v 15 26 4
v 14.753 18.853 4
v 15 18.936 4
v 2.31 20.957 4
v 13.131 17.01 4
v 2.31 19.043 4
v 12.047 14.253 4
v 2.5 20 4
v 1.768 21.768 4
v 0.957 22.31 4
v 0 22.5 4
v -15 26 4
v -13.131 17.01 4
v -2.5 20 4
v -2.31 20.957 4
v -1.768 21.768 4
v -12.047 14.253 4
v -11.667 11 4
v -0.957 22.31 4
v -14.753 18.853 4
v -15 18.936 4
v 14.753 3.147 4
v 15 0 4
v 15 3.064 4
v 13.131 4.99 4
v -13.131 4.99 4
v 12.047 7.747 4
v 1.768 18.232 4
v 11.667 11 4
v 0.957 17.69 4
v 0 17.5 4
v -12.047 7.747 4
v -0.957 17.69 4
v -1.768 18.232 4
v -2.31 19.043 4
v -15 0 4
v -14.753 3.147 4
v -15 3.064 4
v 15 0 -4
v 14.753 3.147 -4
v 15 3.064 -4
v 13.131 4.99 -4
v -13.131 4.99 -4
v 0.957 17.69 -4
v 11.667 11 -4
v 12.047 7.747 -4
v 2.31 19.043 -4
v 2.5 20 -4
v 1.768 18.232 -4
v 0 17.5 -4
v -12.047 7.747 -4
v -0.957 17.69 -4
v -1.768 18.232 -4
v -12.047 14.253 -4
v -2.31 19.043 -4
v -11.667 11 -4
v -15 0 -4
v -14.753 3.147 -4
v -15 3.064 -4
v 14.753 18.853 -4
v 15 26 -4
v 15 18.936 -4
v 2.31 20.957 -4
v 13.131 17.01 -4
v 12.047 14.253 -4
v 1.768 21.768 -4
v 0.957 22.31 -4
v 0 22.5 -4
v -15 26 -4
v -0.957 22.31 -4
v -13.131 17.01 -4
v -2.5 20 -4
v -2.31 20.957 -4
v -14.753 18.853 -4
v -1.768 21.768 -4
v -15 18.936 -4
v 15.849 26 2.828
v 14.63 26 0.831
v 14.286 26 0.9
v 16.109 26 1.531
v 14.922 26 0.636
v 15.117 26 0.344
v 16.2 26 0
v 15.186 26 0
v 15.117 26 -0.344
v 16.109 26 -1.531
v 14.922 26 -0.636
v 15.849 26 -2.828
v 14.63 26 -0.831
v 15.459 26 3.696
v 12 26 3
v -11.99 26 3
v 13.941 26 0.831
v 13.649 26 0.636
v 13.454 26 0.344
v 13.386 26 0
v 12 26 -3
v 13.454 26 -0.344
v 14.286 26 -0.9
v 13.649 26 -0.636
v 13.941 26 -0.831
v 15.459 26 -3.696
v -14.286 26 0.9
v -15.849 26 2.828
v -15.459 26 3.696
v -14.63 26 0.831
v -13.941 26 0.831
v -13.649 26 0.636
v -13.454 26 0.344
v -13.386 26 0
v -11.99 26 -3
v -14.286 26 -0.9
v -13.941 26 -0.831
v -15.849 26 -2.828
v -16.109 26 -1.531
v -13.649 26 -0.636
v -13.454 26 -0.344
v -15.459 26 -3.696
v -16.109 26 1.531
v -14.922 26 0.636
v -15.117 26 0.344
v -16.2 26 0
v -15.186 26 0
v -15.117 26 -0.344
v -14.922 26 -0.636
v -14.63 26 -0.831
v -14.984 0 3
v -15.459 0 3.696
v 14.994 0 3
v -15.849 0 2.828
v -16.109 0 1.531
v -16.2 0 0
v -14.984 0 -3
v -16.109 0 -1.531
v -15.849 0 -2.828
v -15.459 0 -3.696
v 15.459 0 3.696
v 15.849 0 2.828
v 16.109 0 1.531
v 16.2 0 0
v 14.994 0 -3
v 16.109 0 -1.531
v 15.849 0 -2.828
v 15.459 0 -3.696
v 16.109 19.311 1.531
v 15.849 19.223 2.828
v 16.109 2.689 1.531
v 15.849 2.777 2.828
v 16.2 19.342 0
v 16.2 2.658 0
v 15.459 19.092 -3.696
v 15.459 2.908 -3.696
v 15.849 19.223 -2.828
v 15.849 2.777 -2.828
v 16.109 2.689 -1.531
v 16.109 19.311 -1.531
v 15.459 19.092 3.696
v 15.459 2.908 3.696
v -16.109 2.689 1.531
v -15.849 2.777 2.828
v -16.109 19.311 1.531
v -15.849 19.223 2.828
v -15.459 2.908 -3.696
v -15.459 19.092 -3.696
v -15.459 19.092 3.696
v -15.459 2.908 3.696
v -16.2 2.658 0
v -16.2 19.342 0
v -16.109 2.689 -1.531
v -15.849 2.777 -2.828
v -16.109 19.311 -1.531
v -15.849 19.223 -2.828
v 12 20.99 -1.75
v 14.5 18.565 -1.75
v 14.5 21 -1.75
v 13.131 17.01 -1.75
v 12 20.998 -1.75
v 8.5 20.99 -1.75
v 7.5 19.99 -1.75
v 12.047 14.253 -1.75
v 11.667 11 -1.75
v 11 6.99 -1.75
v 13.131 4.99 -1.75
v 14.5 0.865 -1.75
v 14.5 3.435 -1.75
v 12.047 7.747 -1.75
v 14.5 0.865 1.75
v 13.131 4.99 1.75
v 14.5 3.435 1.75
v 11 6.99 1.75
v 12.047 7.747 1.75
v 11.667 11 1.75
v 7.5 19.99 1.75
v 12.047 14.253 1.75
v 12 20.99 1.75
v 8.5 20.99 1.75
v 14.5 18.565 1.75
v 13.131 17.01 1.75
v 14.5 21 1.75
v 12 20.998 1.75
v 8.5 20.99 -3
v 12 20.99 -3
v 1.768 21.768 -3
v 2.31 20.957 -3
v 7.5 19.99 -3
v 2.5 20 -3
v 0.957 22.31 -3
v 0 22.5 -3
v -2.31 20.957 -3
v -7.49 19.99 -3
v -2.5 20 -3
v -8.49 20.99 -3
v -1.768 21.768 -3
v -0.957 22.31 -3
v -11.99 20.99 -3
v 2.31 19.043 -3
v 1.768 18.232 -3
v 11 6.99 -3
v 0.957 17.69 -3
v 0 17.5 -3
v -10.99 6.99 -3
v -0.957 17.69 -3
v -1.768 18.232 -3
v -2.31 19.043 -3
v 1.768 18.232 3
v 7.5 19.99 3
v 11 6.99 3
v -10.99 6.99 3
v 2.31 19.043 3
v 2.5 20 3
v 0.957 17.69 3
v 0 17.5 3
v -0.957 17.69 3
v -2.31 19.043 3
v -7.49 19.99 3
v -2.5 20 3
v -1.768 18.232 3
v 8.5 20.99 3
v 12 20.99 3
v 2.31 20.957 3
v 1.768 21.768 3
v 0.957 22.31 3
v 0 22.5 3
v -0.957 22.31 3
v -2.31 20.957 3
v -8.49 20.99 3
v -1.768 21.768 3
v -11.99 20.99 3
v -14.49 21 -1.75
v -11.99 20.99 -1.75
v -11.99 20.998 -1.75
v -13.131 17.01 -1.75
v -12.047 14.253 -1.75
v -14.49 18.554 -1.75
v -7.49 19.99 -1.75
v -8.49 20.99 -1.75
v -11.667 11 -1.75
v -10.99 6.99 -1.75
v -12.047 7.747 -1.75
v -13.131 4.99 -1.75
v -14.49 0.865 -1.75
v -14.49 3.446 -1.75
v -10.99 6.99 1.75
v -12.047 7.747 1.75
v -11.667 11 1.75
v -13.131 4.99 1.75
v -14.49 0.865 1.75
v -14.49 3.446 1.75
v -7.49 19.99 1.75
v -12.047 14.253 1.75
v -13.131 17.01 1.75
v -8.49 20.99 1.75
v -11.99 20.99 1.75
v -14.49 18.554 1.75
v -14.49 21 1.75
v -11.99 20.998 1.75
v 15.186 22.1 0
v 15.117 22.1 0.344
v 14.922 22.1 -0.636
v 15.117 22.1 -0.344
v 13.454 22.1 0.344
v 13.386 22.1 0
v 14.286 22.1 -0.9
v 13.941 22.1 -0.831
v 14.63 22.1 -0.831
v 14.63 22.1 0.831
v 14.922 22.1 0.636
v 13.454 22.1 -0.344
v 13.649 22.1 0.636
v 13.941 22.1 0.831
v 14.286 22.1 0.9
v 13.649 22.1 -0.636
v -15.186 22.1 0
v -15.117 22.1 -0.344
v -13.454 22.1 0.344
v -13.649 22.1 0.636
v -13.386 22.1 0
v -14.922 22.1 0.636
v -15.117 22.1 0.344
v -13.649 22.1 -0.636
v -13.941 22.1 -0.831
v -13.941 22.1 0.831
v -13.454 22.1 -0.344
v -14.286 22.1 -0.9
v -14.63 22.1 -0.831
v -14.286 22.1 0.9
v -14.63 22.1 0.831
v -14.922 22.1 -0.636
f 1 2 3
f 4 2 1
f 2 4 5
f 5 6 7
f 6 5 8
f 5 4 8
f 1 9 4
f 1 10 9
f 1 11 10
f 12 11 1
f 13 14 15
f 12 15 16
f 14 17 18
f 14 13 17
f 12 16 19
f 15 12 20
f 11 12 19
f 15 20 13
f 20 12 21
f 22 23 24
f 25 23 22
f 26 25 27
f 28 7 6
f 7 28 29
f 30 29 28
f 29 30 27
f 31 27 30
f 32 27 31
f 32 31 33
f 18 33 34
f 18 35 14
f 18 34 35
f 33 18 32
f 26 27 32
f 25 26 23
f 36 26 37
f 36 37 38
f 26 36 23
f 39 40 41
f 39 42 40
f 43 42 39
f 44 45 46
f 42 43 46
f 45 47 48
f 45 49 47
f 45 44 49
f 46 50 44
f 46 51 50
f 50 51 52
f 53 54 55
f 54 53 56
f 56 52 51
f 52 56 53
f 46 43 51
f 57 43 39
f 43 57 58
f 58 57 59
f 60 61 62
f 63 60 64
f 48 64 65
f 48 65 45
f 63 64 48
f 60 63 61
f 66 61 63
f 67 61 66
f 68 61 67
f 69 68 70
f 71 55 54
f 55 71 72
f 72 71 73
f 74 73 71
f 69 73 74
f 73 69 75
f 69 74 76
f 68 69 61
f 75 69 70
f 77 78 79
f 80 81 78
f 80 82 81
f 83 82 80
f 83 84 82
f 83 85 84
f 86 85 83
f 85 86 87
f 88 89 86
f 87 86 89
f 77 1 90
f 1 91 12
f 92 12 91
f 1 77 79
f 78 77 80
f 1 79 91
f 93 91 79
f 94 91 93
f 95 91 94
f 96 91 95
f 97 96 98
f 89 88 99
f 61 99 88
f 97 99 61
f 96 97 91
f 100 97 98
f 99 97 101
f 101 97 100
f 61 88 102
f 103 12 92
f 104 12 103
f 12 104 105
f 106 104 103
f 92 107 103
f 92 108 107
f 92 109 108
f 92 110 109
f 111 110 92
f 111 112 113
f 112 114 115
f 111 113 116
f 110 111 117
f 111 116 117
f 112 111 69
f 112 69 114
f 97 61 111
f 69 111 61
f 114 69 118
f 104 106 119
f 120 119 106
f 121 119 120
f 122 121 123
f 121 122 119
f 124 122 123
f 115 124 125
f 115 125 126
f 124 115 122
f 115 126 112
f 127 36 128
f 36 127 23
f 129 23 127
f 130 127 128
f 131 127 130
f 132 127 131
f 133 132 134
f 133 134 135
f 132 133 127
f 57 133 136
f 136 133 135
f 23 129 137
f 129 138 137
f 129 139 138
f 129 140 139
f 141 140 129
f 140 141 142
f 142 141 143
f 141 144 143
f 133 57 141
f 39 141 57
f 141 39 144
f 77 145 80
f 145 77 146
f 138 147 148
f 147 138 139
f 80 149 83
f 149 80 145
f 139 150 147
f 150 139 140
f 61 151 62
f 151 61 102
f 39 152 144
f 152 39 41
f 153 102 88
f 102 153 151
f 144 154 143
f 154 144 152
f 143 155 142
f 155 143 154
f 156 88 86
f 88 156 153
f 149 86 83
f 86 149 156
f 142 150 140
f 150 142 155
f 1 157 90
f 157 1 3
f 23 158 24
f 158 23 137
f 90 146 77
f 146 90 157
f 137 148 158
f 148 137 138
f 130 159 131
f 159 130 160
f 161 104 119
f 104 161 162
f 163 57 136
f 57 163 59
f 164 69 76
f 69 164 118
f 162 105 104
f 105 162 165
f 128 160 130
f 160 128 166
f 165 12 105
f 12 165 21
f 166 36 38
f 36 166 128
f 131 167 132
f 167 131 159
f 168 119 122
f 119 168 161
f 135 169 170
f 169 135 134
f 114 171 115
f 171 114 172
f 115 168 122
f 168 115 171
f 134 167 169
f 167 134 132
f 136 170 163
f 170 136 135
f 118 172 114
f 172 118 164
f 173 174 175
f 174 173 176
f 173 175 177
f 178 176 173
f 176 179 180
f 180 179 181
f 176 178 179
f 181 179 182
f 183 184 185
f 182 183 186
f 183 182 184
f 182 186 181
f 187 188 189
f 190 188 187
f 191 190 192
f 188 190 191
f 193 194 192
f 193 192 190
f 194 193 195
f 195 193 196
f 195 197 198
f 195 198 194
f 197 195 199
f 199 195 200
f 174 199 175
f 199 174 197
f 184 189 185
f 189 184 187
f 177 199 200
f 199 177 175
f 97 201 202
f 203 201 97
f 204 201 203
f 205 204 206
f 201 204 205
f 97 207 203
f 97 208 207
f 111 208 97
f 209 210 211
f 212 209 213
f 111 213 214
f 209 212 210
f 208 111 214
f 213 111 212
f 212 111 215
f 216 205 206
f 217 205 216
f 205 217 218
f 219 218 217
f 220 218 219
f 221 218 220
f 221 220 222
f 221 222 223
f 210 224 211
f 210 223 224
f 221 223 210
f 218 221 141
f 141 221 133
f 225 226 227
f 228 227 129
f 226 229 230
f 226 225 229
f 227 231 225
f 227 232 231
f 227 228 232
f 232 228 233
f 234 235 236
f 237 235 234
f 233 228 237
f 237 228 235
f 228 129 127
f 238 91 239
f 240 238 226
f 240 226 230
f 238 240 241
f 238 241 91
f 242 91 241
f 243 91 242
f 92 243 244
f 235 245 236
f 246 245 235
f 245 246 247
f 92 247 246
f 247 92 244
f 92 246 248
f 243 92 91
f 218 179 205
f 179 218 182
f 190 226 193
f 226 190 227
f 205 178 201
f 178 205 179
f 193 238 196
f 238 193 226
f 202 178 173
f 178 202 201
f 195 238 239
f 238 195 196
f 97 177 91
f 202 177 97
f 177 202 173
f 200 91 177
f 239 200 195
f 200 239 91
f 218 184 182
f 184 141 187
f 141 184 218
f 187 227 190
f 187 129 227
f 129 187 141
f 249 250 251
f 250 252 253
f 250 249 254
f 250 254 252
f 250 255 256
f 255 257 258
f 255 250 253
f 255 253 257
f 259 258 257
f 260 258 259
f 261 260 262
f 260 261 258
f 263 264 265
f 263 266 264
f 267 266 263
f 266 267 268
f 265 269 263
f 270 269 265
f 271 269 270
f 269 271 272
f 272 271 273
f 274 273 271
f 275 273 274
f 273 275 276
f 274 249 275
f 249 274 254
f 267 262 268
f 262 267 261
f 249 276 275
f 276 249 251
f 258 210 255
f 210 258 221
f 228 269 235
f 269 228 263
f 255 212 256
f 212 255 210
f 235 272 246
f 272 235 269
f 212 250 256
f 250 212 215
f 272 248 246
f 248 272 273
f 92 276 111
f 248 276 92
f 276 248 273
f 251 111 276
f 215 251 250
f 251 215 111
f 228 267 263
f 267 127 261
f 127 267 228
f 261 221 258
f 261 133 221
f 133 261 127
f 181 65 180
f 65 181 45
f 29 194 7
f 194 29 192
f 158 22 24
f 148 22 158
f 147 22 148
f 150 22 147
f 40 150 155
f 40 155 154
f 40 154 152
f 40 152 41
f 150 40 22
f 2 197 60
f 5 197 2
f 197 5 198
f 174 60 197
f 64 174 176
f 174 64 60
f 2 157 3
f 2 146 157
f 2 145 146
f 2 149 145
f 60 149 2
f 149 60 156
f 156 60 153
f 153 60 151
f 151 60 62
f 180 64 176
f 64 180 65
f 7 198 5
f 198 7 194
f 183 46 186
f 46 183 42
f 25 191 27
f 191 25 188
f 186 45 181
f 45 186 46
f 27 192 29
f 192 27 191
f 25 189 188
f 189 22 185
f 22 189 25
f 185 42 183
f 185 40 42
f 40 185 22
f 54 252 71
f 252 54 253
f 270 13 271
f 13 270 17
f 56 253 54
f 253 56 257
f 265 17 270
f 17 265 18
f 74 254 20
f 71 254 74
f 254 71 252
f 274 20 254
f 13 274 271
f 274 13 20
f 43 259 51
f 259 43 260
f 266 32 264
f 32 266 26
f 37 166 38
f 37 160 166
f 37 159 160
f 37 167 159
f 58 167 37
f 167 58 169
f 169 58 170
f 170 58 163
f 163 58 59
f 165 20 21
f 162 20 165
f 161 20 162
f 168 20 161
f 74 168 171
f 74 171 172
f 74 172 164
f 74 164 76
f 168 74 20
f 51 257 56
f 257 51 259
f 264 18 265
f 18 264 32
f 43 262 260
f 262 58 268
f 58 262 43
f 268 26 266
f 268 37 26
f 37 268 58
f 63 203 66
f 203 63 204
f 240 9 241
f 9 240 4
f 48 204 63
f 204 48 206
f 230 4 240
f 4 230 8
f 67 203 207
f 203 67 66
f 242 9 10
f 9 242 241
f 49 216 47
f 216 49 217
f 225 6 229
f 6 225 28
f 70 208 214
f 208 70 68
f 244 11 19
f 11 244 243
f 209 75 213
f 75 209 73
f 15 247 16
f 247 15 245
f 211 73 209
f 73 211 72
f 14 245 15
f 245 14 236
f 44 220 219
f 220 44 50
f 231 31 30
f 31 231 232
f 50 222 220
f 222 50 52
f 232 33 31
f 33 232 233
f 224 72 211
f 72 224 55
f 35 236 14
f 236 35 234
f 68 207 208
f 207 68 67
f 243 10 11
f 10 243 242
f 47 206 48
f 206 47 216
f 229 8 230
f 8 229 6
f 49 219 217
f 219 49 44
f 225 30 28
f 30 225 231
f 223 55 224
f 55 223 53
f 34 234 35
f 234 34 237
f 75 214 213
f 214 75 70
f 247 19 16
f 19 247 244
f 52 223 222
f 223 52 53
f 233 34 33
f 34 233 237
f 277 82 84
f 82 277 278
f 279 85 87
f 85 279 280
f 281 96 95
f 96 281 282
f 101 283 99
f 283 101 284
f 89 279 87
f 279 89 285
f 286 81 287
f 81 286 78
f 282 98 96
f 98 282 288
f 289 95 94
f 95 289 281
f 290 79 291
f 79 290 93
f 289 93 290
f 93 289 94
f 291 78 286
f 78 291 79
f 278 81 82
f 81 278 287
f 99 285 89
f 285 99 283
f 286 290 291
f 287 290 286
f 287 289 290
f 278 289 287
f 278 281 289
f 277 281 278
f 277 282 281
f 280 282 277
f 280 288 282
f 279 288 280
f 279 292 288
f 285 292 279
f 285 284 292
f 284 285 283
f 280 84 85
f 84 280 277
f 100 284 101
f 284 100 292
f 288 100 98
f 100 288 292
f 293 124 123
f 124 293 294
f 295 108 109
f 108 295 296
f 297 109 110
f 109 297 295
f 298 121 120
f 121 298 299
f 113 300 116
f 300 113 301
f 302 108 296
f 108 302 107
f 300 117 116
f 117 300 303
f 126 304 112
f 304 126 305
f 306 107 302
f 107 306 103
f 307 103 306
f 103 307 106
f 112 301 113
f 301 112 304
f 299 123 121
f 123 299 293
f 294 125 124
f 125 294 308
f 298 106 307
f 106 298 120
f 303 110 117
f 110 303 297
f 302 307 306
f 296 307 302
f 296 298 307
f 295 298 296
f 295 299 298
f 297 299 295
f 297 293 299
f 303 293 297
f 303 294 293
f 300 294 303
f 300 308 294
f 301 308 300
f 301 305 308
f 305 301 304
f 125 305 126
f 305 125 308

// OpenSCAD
module half_inner_clip(){
      
    linear_extrude(3.5, center=true)
    {
        polygon([
            [0,0],
            [0,21],
            [14.5,21.01],
            [14.5,0]
        ]);
    }
    linear_extrude(6, center=true)
    {
        polygon([
            [0,0],
            [0,27],
            [12,27],
            [12,21],
            [8.5,21], 
            [7.5,20], 
            [11,7], 
            [15,0]
        ]);
    }
}
    
module inner_clip() {
    union(){
        half_inner_clip();
        
    translate([0.01,0,0])
        mirror([1,0,0])
            half_inner_clip();
    }
}

w=30;
h=8;
l=26;
difference() {
    union() {
        translate([0,13,0])
            cube([w,l,h], center=true); 
        translate([w/2,l/2,0])  
        scale([0.3,1,1])     
            rotate([90,0])
                cylinder(d=h,h=l, center=true, $fn=16);        
        translate([-w/2,l/2,0]) 
        scale([0.3,1,1])
            rotate([90,0])
                cylinder(d=h,h=l, center=true, $fn=16);
    }
    translate([0,-0.01,0])
        inner_clip();
    translate([w/1.8,11,0])
        scale([10,17,h+1])
            cylinder(d=1,h=1, center=true, $fn=16);        
    translate([-w/1.8,11,0])
        scale([10,17,h+1])
            cylinder(d=1,h=1, center=true, $fn=16);
    
    translate([0,l-6,0]) 
            cylinder(d=5,h=h+1, center=true, $fn=16);

    //filament joiner holes
    translate([w/2.1,l+0.1,0])
            rotate([90,0])
                cylinder(d=1.8, h=4, $fn=16);
    translate([-w/2.1,l+0.1,0])
            rotate([90,0])
                cylinder(d=1.8, h=4, $fn=16);
    
/*
    translate([0,0,100])
            cube([200,200,200], center=true);/* */ 
}
